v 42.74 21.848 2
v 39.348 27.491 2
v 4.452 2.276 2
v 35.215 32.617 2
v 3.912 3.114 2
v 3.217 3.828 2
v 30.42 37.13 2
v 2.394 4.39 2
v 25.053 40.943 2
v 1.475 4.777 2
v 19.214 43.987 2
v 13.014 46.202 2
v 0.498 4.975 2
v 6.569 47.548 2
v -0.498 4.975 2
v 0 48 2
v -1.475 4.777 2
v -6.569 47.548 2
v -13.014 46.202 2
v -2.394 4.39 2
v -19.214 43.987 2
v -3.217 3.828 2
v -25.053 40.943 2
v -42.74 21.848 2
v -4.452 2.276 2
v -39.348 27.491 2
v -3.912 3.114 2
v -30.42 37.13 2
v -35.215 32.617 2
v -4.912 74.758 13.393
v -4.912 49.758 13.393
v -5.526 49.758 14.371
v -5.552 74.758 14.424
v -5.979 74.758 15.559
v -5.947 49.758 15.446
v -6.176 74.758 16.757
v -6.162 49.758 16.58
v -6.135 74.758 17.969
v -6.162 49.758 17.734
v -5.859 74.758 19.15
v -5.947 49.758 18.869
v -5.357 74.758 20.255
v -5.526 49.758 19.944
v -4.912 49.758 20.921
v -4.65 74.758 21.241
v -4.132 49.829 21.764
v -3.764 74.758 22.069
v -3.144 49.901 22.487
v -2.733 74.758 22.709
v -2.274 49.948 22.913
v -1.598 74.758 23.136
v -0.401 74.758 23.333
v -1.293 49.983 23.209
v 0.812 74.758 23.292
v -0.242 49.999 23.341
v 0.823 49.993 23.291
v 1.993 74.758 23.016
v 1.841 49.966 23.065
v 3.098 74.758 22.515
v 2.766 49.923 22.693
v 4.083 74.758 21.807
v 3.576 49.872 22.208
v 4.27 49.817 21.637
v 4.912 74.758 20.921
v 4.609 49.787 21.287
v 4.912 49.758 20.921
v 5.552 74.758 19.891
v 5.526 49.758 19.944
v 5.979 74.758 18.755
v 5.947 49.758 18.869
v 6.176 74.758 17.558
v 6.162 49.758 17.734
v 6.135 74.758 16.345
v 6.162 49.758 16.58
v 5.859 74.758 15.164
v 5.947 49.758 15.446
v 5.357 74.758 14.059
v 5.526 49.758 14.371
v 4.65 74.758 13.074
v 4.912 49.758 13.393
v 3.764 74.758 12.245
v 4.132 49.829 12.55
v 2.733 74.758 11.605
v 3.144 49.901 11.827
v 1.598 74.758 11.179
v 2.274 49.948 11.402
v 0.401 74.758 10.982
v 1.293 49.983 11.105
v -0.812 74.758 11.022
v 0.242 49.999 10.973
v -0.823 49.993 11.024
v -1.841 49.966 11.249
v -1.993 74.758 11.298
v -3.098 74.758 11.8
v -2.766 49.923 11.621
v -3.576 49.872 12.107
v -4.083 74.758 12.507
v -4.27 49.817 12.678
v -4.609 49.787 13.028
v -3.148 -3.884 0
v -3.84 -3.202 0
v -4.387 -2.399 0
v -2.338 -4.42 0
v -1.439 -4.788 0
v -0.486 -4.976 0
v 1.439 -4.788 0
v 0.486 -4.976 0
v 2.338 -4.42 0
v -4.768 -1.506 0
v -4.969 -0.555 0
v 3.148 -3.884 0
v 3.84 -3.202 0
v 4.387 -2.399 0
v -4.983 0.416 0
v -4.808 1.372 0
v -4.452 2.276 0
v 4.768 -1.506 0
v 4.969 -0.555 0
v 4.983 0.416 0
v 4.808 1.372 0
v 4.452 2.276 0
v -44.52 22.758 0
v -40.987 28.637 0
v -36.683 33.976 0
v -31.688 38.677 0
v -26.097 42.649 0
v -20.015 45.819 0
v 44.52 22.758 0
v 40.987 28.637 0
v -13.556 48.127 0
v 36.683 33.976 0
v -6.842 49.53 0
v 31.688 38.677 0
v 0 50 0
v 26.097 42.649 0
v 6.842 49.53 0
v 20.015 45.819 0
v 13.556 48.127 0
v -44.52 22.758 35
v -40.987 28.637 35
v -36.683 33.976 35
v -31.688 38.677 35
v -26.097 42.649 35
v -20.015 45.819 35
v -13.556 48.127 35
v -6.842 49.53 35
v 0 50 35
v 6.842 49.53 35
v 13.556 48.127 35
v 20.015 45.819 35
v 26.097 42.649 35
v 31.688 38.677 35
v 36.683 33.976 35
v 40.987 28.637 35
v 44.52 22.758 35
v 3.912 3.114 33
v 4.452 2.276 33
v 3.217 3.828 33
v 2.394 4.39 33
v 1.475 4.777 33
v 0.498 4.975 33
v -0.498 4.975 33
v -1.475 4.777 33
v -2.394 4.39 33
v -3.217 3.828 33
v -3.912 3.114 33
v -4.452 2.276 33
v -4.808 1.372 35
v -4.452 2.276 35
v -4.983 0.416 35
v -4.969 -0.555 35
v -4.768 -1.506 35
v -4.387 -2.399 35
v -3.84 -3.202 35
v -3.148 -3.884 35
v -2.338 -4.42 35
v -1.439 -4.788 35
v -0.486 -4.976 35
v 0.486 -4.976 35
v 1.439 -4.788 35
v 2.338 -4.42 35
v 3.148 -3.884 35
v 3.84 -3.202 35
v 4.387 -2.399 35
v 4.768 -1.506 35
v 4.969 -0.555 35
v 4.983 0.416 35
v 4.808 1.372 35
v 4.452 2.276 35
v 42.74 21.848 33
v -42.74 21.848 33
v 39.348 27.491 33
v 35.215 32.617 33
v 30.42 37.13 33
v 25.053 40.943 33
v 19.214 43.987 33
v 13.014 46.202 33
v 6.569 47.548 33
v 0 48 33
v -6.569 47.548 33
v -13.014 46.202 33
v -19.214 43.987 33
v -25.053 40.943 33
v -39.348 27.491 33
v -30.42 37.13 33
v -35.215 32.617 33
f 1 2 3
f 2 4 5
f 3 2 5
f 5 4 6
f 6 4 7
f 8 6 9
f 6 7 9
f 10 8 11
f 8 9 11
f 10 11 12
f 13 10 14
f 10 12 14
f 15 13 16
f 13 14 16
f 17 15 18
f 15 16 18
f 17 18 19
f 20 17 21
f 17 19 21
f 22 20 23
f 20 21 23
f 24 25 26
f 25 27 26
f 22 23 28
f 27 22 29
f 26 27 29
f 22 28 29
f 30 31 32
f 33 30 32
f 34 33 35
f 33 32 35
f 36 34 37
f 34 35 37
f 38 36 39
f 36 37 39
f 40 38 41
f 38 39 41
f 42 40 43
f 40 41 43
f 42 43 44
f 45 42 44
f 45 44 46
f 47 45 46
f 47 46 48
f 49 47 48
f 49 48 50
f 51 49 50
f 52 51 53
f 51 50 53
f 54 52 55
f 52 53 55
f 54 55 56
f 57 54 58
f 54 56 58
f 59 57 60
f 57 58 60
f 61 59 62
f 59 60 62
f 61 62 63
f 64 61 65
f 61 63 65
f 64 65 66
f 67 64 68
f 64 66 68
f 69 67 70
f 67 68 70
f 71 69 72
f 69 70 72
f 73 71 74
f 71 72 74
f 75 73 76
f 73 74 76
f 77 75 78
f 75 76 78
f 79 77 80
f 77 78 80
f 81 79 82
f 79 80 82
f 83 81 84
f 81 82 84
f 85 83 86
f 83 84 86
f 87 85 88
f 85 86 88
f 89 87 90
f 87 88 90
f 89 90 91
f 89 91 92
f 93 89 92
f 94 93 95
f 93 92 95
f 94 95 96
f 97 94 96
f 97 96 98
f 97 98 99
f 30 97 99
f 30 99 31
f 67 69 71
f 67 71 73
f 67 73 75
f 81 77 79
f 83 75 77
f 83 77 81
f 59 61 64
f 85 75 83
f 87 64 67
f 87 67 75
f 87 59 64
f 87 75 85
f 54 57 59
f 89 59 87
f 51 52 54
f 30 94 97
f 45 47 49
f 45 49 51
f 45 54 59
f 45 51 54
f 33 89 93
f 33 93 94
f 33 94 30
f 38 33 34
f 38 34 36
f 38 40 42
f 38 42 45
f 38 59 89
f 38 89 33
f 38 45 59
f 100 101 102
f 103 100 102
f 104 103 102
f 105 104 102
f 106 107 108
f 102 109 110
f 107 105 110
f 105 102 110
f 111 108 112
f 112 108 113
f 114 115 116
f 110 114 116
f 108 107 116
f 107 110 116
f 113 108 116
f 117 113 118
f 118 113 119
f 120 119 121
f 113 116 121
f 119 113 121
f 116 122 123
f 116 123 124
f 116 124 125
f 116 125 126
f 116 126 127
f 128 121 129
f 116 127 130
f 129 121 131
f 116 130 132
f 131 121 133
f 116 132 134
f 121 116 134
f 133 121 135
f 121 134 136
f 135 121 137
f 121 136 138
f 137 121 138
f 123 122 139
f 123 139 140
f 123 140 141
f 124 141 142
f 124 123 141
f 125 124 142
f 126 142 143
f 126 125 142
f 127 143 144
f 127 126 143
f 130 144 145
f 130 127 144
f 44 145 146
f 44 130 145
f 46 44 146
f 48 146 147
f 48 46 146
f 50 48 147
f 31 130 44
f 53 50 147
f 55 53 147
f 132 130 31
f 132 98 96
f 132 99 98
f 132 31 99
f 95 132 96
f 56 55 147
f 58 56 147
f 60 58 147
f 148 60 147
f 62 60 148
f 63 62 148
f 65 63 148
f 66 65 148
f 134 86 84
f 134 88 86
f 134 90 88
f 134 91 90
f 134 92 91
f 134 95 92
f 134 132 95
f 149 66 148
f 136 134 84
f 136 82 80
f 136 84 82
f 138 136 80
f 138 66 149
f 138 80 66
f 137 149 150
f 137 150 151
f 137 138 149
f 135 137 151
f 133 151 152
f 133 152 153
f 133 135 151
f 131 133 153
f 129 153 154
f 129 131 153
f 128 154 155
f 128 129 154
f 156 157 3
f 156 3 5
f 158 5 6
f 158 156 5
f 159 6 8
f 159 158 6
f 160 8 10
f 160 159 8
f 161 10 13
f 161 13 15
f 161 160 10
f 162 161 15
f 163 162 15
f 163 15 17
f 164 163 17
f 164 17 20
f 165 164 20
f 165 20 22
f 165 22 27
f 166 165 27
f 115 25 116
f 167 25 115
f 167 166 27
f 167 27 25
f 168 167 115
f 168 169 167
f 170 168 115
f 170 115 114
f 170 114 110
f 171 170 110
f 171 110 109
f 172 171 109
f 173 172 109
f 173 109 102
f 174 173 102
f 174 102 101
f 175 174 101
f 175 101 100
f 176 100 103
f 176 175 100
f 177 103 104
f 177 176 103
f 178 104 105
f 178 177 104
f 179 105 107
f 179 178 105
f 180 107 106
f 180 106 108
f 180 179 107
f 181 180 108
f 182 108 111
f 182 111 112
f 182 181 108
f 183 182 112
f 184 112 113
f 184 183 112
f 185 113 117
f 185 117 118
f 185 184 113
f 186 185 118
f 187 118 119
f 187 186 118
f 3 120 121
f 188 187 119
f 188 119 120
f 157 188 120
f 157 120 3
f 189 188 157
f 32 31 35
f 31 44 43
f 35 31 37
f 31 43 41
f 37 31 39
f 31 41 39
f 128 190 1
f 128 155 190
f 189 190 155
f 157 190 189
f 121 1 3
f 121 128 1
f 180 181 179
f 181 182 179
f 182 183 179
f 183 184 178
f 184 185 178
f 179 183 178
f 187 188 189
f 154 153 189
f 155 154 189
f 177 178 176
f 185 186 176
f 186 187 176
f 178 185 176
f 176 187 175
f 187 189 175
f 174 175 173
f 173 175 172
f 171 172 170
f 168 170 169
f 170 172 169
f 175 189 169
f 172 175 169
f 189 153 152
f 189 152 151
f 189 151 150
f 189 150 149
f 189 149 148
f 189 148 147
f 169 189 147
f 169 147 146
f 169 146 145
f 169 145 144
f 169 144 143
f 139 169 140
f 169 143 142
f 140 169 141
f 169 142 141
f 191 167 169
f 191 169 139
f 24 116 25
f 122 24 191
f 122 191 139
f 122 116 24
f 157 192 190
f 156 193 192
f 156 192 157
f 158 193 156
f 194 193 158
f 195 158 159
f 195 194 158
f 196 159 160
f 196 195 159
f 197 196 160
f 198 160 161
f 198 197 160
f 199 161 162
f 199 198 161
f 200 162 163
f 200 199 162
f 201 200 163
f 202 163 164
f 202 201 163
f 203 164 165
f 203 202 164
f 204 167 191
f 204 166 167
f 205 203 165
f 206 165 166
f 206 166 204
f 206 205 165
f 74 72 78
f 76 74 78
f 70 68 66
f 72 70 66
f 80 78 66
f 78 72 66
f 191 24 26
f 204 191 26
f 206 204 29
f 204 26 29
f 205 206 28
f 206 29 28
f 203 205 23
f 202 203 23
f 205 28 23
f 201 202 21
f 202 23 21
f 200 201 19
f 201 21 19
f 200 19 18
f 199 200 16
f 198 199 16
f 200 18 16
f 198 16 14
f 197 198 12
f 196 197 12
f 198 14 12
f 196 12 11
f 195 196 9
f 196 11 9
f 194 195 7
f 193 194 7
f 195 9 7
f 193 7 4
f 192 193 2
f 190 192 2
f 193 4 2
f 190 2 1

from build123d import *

# Parameters (mm, degrees)
BOSS_EXTRUDE1_DEPTH = 35
SHELL1_T            = -2
SKETCH3_R           = 5
BOSS_EXTRUDE2_DEPTH = 35
SKETCH4_R           = 6.188496774
BOSS_EXTRUDE3_DEPTH = 25


with BuildPart() as part:
    # Sketch2 → Boss-Extrude1 (new body)
    with BuildSketch(Plane.XY):
        with BuildLine():
            Line((0, 0), (-44.5203539, 22.758253198))
            ThreePointArc((-44.5203539, 22.758253198), (0, 50), (44.5203539, 22.758253198))
            Line((44.5203539, 22.758253198), (0, 0))
        make_face()
    extrude(amount=BOSS_EXTRUDE1_DEPTH)

    # Shell1
    shell1_openings = [part.faces().sort_by_distance(p)[0] for p in [
        (-22.26017695, 11.379126599, 17.5),
        (22.26017695, 11.379126599, 17.5),
    ]]
    offset(amount=SHELL1_T, openings=shell1_openings, kind=Kind.INTERSECTION)

    # Sketch3 → Boss-Extrude2 (add)
    with BuildSketch(Plane.XY.offset(35)):
        with Locations(Location((0, 0, 0), (0, 0, 27.075555237))):
            Circle(SKETCH3_R)
    extrude(amount=-BOSS_EXTRUDE2_DEPTH)

    # Sketch4 → Boss-Extrude3 (add)
    with BuildSketch(Plane(origin=(0, 49.758126055, 0), x_dir=(1, 0, 0), z_dir=(0, 1, 0))):
        with Locations(Location((0, -17.15723549, 0), (0, 0, 142.53731078))):
            Circle(SKETCH4_R)
    extrude(amount=BOSS_EXTRUDE3_DEPTH)


solid = part.part
